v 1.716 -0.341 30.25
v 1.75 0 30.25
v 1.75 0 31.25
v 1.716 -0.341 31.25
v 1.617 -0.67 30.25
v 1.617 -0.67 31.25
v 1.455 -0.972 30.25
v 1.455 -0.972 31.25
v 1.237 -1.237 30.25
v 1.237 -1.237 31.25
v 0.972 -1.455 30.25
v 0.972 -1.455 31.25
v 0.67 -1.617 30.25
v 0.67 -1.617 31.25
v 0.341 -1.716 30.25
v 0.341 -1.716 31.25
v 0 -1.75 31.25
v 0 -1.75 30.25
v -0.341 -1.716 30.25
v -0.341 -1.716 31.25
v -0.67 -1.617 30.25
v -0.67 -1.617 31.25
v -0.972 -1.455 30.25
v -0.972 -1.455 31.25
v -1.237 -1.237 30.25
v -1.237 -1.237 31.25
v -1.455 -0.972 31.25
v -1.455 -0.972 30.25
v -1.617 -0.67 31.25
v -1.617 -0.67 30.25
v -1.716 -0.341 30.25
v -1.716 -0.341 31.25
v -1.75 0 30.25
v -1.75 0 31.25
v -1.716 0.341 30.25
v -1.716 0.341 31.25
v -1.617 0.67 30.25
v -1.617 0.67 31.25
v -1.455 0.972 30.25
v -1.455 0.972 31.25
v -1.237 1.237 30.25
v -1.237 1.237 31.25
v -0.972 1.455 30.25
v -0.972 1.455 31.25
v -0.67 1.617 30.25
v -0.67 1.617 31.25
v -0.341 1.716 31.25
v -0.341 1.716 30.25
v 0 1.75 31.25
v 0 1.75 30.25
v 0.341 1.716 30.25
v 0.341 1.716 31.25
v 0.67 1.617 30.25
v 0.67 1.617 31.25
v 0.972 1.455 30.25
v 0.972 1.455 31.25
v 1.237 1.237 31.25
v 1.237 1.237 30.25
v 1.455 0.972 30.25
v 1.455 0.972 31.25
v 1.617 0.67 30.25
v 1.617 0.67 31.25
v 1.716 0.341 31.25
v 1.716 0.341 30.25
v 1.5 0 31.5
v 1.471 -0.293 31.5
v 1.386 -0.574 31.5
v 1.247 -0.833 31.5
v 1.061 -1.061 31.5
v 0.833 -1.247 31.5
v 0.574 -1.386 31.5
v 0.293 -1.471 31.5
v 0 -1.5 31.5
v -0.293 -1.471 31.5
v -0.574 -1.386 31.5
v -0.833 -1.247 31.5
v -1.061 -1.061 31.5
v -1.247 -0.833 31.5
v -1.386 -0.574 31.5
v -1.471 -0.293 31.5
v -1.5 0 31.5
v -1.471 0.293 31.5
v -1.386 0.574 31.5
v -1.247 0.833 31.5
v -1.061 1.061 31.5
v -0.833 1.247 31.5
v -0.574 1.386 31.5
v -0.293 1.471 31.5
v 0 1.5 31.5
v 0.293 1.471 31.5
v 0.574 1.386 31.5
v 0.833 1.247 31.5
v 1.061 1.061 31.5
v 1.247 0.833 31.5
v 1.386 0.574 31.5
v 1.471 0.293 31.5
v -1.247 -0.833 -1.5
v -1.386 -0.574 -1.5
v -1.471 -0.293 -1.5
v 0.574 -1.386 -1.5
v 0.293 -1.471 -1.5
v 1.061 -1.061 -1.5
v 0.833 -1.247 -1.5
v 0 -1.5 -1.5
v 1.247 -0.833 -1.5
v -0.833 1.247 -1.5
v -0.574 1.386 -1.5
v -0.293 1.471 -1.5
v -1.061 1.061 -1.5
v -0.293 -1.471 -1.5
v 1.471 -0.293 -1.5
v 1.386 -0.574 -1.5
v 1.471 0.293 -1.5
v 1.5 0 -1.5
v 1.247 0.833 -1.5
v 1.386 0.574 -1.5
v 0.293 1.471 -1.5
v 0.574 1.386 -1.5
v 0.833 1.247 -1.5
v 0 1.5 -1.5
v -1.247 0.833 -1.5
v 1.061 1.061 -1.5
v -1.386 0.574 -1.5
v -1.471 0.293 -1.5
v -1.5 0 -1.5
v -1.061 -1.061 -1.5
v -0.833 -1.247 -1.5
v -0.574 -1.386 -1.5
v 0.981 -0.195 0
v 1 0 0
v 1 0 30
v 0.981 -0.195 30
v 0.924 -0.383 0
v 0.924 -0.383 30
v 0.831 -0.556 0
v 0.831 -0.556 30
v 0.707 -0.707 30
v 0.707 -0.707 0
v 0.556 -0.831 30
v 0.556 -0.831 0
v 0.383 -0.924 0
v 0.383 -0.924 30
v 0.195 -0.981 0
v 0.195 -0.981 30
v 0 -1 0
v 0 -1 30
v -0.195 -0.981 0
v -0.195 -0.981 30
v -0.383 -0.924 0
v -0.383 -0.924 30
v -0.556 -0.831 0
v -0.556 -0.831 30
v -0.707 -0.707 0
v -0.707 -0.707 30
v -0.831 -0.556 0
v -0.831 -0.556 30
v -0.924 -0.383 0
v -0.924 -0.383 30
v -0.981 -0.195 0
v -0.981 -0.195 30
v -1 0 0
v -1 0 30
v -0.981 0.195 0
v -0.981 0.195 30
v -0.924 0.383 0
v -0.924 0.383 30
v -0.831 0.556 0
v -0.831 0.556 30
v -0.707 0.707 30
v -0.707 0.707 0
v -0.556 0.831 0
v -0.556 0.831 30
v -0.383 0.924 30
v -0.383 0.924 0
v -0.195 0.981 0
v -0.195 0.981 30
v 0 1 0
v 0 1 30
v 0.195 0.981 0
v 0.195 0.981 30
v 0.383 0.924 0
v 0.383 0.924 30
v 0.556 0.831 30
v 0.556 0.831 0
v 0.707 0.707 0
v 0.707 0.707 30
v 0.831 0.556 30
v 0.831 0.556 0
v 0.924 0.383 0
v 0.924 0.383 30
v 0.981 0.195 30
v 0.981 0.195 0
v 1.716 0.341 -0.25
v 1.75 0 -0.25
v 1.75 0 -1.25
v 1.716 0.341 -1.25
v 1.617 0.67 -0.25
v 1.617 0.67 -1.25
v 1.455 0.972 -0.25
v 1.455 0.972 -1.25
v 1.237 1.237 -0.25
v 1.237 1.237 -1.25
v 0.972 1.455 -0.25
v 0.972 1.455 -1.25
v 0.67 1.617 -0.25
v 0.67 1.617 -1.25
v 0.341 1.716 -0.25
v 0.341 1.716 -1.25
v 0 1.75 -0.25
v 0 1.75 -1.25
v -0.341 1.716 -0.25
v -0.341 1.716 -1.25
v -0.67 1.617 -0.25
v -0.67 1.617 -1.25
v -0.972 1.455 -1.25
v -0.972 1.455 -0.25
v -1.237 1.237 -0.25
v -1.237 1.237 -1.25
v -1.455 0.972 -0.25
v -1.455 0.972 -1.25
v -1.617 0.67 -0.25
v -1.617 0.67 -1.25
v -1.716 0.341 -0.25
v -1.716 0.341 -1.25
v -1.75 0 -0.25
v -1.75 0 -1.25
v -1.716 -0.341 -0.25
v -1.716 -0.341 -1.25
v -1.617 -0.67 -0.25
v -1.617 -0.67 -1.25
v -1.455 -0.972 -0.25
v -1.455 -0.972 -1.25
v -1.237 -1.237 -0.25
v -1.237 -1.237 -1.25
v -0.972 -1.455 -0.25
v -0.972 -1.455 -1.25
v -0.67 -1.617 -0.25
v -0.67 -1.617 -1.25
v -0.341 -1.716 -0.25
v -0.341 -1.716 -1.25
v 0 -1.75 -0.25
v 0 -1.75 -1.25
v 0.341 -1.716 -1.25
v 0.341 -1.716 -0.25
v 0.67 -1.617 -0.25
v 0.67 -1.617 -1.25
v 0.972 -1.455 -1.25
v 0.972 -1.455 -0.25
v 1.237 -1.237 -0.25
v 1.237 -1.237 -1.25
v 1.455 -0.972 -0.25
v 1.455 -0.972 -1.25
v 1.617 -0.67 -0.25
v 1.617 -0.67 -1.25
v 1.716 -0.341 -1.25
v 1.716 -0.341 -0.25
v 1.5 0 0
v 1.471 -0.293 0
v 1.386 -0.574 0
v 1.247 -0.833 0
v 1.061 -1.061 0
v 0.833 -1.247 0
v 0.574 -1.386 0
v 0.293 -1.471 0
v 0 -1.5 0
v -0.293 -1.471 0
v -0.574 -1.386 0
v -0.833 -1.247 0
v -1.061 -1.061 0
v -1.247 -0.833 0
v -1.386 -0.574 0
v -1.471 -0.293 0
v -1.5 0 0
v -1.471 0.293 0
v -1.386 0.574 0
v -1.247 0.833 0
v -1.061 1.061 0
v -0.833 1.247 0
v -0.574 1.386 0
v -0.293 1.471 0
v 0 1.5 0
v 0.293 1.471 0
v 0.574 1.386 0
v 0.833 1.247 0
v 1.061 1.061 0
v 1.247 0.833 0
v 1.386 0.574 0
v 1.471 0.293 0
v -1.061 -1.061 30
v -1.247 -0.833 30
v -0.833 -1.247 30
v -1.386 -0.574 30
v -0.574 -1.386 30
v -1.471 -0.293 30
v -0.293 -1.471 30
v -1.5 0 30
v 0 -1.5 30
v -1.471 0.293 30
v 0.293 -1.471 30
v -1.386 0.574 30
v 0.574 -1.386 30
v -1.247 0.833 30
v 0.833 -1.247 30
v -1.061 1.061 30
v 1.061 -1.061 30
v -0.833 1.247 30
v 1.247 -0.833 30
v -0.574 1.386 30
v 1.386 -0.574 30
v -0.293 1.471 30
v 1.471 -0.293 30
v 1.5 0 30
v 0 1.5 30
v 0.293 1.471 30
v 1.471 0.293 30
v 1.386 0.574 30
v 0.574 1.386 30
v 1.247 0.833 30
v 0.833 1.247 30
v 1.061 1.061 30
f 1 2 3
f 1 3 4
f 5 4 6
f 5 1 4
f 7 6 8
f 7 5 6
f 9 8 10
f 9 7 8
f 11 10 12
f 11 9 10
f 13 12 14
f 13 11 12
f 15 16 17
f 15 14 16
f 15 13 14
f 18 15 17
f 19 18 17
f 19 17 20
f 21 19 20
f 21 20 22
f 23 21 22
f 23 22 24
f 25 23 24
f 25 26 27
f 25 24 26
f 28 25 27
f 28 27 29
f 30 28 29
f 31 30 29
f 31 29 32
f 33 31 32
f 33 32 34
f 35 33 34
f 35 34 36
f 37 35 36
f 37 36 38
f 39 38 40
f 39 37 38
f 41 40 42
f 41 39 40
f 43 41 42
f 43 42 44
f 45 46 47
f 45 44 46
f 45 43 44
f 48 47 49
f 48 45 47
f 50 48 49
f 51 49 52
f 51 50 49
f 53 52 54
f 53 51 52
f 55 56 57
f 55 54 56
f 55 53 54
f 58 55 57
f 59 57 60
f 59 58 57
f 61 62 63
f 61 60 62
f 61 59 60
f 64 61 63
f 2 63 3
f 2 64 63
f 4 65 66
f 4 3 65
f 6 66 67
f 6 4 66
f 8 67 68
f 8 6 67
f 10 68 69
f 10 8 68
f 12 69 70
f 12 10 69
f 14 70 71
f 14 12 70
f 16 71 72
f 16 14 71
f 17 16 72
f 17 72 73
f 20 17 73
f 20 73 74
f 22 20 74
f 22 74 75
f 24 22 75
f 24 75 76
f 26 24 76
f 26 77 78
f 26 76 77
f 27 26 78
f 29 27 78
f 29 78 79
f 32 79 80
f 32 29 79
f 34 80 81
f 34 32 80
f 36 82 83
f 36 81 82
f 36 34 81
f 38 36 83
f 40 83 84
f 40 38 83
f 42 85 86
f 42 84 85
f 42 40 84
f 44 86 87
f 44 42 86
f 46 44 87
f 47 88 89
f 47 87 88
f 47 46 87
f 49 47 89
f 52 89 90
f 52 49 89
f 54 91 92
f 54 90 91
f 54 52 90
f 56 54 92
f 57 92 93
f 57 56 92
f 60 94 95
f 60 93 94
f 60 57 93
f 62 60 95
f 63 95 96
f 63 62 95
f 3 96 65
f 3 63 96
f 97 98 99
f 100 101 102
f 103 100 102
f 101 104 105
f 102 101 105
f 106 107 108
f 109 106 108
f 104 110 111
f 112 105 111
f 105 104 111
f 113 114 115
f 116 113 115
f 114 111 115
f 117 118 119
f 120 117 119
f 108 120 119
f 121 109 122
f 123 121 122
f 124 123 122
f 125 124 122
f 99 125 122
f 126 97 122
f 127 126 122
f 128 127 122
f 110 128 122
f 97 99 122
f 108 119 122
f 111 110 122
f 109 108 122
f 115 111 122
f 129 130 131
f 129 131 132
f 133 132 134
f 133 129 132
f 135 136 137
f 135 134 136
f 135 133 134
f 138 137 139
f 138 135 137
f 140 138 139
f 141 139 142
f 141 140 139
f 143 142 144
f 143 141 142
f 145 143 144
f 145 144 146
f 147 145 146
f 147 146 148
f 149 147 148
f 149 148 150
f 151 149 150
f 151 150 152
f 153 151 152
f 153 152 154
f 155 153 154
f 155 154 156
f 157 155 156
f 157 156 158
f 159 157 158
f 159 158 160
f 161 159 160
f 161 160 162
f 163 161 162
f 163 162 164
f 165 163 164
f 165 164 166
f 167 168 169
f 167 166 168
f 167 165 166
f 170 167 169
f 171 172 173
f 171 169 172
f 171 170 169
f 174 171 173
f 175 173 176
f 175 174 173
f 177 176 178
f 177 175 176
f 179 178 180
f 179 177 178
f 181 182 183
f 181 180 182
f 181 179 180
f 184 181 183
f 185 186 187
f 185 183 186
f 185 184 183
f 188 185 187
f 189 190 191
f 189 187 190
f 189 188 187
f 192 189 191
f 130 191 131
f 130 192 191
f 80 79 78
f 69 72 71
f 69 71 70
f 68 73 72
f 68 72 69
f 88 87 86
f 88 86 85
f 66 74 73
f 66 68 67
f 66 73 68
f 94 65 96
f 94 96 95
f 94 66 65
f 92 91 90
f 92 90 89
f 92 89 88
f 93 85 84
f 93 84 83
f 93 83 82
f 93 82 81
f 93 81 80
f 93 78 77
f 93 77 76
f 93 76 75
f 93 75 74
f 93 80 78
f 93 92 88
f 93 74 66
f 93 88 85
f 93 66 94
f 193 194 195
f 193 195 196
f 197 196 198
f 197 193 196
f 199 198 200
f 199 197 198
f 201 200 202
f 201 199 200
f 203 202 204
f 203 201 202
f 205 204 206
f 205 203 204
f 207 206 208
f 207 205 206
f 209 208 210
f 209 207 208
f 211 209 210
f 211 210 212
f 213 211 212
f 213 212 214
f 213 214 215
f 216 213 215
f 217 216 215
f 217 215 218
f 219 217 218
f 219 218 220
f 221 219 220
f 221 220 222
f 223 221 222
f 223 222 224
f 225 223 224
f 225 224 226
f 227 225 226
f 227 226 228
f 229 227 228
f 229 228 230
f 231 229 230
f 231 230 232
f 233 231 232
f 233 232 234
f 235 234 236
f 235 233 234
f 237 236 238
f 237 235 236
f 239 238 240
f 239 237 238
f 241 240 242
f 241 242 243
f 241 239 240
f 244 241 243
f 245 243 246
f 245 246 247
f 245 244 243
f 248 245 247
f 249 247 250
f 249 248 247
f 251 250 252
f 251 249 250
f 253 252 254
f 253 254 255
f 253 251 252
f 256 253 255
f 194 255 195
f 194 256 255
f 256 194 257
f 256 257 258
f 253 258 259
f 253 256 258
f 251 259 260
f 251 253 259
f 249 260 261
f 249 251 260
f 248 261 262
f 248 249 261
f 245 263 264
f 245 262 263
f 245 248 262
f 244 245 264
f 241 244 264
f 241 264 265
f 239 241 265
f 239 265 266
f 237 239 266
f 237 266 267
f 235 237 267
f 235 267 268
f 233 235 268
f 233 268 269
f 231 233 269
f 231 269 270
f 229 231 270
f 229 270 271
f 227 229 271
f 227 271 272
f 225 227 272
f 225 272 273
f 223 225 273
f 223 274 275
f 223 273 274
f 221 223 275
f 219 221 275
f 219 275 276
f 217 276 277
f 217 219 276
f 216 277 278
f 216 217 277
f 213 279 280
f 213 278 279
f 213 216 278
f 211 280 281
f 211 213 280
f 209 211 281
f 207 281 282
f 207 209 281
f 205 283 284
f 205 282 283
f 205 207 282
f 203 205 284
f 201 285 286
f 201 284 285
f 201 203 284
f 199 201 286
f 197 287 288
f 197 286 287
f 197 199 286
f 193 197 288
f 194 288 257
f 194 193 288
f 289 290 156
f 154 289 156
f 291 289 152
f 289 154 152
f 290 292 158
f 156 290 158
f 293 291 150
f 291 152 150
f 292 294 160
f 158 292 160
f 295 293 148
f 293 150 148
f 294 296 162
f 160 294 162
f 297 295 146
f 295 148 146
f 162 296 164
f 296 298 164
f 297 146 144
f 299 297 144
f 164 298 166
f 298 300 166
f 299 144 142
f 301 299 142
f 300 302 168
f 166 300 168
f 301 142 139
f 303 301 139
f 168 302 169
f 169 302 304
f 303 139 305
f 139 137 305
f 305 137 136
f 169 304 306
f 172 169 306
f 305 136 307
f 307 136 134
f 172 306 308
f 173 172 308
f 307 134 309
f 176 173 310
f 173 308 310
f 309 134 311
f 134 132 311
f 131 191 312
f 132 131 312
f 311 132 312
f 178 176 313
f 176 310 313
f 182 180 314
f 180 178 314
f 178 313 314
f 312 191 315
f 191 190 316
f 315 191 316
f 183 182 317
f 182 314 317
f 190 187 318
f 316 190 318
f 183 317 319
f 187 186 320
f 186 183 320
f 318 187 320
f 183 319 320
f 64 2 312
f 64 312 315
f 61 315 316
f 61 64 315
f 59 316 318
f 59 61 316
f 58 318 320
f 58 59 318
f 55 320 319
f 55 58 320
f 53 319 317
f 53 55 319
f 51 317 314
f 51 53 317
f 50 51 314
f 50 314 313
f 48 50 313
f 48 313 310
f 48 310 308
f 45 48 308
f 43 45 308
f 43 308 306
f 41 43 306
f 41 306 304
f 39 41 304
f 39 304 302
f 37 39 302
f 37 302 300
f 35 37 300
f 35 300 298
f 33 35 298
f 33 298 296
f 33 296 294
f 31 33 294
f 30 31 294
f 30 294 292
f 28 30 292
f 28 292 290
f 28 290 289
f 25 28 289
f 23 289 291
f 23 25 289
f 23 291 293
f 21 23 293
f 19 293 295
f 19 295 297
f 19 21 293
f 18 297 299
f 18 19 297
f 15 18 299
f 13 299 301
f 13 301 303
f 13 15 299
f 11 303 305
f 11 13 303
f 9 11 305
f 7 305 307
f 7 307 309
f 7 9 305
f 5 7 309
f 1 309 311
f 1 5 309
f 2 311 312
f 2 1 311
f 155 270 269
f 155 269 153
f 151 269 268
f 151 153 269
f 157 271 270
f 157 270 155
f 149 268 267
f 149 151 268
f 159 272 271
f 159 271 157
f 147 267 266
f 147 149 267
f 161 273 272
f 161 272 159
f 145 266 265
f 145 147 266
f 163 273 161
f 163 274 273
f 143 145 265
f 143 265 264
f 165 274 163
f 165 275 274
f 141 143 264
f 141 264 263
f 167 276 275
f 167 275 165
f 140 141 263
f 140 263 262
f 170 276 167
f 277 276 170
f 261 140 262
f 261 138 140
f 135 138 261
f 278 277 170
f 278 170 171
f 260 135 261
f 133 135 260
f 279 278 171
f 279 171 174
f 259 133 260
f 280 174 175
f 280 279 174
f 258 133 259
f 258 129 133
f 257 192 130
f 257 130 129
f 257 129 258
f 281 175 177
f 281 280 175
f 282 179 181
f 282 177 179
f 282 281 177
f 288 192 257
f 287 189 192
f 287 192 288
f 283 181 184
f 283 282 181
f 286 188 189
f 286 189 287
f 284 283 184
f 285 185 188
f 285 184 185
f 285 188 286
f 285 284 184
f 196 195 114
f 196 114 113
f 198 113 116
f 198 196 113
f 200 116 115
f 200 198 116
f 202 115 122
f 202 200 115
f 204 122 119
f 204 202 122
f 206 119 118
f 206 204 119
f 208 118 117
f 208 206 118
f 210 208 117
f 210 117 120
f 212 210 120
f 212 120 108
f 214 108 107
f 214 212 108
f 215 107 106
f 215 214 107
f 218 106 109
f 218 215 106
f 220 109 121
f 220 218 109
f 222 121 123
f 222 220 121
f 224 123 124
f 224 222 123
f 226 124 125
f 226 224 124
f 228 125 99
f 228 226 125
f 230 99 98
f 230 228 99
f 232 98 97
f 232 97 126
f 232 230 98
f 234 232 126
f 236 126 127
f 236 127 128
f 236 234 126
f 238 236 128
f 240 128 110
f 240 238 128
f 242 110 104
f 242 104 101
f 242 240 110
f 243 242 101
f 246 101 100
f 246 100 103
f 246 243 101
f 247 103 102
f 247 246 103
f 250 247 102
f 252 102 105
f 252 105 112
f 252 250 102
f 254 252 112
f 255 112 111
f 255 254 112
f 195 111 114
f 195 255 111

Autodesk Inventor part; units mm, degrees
ref_plane "YZ Plane" through (0, 0, 0) normal (1, 0, 0) x (0, 1, 0)
ref_plane "XZ Plane" through (0, 0, 0) normal (0, 1, 0) x (-1, 0, 0)
ref_plane "XY Plane" through (0, 0, 0) normal (0, 0, 1) x (1, 0, 0)
sketch "Sketch1" plane through (0, 0, 0) normal (0, 0, 1) x (1, 0, 0)
  circle A0 centre (0, 0) radius 1
  circle A1 centre (0, 0) radius 1.75
  dimension "d0" = 2
  dimension "d1" = 3.5
extrude "Extrusion1" add sketch "Sketch1" along normal blind 30 contours A0
extrude "Extrusion2" add sketch "Sketch1" against normal blind 1.5 contours A0 | A1
sketch "Sketch2" plane through (0, 0, 30) normal (0, 0, 1) x (1, 0, 0)
  circle A0 centre (0, 0) radius 1.75 projected
  circle A1 centre (0, 0) radius 1 projected
  circle A2 centre (0, 0) radius 1 projected
extrude "Extrusion3" add sketch "Sketch2" along normal blind 1.5 contours A0 | A1
chamfer "Chamfer1" distance 0.25 angle 45 4 edges at (-1.75, 0, 31.5) (-1.75, 0, -1.5) (-1.75, 0, 30) (-1.75, 0, 0)
properties part number "CNCT_STEEL_Outlet_door_hinge_pin" material "Stainless Steel"
